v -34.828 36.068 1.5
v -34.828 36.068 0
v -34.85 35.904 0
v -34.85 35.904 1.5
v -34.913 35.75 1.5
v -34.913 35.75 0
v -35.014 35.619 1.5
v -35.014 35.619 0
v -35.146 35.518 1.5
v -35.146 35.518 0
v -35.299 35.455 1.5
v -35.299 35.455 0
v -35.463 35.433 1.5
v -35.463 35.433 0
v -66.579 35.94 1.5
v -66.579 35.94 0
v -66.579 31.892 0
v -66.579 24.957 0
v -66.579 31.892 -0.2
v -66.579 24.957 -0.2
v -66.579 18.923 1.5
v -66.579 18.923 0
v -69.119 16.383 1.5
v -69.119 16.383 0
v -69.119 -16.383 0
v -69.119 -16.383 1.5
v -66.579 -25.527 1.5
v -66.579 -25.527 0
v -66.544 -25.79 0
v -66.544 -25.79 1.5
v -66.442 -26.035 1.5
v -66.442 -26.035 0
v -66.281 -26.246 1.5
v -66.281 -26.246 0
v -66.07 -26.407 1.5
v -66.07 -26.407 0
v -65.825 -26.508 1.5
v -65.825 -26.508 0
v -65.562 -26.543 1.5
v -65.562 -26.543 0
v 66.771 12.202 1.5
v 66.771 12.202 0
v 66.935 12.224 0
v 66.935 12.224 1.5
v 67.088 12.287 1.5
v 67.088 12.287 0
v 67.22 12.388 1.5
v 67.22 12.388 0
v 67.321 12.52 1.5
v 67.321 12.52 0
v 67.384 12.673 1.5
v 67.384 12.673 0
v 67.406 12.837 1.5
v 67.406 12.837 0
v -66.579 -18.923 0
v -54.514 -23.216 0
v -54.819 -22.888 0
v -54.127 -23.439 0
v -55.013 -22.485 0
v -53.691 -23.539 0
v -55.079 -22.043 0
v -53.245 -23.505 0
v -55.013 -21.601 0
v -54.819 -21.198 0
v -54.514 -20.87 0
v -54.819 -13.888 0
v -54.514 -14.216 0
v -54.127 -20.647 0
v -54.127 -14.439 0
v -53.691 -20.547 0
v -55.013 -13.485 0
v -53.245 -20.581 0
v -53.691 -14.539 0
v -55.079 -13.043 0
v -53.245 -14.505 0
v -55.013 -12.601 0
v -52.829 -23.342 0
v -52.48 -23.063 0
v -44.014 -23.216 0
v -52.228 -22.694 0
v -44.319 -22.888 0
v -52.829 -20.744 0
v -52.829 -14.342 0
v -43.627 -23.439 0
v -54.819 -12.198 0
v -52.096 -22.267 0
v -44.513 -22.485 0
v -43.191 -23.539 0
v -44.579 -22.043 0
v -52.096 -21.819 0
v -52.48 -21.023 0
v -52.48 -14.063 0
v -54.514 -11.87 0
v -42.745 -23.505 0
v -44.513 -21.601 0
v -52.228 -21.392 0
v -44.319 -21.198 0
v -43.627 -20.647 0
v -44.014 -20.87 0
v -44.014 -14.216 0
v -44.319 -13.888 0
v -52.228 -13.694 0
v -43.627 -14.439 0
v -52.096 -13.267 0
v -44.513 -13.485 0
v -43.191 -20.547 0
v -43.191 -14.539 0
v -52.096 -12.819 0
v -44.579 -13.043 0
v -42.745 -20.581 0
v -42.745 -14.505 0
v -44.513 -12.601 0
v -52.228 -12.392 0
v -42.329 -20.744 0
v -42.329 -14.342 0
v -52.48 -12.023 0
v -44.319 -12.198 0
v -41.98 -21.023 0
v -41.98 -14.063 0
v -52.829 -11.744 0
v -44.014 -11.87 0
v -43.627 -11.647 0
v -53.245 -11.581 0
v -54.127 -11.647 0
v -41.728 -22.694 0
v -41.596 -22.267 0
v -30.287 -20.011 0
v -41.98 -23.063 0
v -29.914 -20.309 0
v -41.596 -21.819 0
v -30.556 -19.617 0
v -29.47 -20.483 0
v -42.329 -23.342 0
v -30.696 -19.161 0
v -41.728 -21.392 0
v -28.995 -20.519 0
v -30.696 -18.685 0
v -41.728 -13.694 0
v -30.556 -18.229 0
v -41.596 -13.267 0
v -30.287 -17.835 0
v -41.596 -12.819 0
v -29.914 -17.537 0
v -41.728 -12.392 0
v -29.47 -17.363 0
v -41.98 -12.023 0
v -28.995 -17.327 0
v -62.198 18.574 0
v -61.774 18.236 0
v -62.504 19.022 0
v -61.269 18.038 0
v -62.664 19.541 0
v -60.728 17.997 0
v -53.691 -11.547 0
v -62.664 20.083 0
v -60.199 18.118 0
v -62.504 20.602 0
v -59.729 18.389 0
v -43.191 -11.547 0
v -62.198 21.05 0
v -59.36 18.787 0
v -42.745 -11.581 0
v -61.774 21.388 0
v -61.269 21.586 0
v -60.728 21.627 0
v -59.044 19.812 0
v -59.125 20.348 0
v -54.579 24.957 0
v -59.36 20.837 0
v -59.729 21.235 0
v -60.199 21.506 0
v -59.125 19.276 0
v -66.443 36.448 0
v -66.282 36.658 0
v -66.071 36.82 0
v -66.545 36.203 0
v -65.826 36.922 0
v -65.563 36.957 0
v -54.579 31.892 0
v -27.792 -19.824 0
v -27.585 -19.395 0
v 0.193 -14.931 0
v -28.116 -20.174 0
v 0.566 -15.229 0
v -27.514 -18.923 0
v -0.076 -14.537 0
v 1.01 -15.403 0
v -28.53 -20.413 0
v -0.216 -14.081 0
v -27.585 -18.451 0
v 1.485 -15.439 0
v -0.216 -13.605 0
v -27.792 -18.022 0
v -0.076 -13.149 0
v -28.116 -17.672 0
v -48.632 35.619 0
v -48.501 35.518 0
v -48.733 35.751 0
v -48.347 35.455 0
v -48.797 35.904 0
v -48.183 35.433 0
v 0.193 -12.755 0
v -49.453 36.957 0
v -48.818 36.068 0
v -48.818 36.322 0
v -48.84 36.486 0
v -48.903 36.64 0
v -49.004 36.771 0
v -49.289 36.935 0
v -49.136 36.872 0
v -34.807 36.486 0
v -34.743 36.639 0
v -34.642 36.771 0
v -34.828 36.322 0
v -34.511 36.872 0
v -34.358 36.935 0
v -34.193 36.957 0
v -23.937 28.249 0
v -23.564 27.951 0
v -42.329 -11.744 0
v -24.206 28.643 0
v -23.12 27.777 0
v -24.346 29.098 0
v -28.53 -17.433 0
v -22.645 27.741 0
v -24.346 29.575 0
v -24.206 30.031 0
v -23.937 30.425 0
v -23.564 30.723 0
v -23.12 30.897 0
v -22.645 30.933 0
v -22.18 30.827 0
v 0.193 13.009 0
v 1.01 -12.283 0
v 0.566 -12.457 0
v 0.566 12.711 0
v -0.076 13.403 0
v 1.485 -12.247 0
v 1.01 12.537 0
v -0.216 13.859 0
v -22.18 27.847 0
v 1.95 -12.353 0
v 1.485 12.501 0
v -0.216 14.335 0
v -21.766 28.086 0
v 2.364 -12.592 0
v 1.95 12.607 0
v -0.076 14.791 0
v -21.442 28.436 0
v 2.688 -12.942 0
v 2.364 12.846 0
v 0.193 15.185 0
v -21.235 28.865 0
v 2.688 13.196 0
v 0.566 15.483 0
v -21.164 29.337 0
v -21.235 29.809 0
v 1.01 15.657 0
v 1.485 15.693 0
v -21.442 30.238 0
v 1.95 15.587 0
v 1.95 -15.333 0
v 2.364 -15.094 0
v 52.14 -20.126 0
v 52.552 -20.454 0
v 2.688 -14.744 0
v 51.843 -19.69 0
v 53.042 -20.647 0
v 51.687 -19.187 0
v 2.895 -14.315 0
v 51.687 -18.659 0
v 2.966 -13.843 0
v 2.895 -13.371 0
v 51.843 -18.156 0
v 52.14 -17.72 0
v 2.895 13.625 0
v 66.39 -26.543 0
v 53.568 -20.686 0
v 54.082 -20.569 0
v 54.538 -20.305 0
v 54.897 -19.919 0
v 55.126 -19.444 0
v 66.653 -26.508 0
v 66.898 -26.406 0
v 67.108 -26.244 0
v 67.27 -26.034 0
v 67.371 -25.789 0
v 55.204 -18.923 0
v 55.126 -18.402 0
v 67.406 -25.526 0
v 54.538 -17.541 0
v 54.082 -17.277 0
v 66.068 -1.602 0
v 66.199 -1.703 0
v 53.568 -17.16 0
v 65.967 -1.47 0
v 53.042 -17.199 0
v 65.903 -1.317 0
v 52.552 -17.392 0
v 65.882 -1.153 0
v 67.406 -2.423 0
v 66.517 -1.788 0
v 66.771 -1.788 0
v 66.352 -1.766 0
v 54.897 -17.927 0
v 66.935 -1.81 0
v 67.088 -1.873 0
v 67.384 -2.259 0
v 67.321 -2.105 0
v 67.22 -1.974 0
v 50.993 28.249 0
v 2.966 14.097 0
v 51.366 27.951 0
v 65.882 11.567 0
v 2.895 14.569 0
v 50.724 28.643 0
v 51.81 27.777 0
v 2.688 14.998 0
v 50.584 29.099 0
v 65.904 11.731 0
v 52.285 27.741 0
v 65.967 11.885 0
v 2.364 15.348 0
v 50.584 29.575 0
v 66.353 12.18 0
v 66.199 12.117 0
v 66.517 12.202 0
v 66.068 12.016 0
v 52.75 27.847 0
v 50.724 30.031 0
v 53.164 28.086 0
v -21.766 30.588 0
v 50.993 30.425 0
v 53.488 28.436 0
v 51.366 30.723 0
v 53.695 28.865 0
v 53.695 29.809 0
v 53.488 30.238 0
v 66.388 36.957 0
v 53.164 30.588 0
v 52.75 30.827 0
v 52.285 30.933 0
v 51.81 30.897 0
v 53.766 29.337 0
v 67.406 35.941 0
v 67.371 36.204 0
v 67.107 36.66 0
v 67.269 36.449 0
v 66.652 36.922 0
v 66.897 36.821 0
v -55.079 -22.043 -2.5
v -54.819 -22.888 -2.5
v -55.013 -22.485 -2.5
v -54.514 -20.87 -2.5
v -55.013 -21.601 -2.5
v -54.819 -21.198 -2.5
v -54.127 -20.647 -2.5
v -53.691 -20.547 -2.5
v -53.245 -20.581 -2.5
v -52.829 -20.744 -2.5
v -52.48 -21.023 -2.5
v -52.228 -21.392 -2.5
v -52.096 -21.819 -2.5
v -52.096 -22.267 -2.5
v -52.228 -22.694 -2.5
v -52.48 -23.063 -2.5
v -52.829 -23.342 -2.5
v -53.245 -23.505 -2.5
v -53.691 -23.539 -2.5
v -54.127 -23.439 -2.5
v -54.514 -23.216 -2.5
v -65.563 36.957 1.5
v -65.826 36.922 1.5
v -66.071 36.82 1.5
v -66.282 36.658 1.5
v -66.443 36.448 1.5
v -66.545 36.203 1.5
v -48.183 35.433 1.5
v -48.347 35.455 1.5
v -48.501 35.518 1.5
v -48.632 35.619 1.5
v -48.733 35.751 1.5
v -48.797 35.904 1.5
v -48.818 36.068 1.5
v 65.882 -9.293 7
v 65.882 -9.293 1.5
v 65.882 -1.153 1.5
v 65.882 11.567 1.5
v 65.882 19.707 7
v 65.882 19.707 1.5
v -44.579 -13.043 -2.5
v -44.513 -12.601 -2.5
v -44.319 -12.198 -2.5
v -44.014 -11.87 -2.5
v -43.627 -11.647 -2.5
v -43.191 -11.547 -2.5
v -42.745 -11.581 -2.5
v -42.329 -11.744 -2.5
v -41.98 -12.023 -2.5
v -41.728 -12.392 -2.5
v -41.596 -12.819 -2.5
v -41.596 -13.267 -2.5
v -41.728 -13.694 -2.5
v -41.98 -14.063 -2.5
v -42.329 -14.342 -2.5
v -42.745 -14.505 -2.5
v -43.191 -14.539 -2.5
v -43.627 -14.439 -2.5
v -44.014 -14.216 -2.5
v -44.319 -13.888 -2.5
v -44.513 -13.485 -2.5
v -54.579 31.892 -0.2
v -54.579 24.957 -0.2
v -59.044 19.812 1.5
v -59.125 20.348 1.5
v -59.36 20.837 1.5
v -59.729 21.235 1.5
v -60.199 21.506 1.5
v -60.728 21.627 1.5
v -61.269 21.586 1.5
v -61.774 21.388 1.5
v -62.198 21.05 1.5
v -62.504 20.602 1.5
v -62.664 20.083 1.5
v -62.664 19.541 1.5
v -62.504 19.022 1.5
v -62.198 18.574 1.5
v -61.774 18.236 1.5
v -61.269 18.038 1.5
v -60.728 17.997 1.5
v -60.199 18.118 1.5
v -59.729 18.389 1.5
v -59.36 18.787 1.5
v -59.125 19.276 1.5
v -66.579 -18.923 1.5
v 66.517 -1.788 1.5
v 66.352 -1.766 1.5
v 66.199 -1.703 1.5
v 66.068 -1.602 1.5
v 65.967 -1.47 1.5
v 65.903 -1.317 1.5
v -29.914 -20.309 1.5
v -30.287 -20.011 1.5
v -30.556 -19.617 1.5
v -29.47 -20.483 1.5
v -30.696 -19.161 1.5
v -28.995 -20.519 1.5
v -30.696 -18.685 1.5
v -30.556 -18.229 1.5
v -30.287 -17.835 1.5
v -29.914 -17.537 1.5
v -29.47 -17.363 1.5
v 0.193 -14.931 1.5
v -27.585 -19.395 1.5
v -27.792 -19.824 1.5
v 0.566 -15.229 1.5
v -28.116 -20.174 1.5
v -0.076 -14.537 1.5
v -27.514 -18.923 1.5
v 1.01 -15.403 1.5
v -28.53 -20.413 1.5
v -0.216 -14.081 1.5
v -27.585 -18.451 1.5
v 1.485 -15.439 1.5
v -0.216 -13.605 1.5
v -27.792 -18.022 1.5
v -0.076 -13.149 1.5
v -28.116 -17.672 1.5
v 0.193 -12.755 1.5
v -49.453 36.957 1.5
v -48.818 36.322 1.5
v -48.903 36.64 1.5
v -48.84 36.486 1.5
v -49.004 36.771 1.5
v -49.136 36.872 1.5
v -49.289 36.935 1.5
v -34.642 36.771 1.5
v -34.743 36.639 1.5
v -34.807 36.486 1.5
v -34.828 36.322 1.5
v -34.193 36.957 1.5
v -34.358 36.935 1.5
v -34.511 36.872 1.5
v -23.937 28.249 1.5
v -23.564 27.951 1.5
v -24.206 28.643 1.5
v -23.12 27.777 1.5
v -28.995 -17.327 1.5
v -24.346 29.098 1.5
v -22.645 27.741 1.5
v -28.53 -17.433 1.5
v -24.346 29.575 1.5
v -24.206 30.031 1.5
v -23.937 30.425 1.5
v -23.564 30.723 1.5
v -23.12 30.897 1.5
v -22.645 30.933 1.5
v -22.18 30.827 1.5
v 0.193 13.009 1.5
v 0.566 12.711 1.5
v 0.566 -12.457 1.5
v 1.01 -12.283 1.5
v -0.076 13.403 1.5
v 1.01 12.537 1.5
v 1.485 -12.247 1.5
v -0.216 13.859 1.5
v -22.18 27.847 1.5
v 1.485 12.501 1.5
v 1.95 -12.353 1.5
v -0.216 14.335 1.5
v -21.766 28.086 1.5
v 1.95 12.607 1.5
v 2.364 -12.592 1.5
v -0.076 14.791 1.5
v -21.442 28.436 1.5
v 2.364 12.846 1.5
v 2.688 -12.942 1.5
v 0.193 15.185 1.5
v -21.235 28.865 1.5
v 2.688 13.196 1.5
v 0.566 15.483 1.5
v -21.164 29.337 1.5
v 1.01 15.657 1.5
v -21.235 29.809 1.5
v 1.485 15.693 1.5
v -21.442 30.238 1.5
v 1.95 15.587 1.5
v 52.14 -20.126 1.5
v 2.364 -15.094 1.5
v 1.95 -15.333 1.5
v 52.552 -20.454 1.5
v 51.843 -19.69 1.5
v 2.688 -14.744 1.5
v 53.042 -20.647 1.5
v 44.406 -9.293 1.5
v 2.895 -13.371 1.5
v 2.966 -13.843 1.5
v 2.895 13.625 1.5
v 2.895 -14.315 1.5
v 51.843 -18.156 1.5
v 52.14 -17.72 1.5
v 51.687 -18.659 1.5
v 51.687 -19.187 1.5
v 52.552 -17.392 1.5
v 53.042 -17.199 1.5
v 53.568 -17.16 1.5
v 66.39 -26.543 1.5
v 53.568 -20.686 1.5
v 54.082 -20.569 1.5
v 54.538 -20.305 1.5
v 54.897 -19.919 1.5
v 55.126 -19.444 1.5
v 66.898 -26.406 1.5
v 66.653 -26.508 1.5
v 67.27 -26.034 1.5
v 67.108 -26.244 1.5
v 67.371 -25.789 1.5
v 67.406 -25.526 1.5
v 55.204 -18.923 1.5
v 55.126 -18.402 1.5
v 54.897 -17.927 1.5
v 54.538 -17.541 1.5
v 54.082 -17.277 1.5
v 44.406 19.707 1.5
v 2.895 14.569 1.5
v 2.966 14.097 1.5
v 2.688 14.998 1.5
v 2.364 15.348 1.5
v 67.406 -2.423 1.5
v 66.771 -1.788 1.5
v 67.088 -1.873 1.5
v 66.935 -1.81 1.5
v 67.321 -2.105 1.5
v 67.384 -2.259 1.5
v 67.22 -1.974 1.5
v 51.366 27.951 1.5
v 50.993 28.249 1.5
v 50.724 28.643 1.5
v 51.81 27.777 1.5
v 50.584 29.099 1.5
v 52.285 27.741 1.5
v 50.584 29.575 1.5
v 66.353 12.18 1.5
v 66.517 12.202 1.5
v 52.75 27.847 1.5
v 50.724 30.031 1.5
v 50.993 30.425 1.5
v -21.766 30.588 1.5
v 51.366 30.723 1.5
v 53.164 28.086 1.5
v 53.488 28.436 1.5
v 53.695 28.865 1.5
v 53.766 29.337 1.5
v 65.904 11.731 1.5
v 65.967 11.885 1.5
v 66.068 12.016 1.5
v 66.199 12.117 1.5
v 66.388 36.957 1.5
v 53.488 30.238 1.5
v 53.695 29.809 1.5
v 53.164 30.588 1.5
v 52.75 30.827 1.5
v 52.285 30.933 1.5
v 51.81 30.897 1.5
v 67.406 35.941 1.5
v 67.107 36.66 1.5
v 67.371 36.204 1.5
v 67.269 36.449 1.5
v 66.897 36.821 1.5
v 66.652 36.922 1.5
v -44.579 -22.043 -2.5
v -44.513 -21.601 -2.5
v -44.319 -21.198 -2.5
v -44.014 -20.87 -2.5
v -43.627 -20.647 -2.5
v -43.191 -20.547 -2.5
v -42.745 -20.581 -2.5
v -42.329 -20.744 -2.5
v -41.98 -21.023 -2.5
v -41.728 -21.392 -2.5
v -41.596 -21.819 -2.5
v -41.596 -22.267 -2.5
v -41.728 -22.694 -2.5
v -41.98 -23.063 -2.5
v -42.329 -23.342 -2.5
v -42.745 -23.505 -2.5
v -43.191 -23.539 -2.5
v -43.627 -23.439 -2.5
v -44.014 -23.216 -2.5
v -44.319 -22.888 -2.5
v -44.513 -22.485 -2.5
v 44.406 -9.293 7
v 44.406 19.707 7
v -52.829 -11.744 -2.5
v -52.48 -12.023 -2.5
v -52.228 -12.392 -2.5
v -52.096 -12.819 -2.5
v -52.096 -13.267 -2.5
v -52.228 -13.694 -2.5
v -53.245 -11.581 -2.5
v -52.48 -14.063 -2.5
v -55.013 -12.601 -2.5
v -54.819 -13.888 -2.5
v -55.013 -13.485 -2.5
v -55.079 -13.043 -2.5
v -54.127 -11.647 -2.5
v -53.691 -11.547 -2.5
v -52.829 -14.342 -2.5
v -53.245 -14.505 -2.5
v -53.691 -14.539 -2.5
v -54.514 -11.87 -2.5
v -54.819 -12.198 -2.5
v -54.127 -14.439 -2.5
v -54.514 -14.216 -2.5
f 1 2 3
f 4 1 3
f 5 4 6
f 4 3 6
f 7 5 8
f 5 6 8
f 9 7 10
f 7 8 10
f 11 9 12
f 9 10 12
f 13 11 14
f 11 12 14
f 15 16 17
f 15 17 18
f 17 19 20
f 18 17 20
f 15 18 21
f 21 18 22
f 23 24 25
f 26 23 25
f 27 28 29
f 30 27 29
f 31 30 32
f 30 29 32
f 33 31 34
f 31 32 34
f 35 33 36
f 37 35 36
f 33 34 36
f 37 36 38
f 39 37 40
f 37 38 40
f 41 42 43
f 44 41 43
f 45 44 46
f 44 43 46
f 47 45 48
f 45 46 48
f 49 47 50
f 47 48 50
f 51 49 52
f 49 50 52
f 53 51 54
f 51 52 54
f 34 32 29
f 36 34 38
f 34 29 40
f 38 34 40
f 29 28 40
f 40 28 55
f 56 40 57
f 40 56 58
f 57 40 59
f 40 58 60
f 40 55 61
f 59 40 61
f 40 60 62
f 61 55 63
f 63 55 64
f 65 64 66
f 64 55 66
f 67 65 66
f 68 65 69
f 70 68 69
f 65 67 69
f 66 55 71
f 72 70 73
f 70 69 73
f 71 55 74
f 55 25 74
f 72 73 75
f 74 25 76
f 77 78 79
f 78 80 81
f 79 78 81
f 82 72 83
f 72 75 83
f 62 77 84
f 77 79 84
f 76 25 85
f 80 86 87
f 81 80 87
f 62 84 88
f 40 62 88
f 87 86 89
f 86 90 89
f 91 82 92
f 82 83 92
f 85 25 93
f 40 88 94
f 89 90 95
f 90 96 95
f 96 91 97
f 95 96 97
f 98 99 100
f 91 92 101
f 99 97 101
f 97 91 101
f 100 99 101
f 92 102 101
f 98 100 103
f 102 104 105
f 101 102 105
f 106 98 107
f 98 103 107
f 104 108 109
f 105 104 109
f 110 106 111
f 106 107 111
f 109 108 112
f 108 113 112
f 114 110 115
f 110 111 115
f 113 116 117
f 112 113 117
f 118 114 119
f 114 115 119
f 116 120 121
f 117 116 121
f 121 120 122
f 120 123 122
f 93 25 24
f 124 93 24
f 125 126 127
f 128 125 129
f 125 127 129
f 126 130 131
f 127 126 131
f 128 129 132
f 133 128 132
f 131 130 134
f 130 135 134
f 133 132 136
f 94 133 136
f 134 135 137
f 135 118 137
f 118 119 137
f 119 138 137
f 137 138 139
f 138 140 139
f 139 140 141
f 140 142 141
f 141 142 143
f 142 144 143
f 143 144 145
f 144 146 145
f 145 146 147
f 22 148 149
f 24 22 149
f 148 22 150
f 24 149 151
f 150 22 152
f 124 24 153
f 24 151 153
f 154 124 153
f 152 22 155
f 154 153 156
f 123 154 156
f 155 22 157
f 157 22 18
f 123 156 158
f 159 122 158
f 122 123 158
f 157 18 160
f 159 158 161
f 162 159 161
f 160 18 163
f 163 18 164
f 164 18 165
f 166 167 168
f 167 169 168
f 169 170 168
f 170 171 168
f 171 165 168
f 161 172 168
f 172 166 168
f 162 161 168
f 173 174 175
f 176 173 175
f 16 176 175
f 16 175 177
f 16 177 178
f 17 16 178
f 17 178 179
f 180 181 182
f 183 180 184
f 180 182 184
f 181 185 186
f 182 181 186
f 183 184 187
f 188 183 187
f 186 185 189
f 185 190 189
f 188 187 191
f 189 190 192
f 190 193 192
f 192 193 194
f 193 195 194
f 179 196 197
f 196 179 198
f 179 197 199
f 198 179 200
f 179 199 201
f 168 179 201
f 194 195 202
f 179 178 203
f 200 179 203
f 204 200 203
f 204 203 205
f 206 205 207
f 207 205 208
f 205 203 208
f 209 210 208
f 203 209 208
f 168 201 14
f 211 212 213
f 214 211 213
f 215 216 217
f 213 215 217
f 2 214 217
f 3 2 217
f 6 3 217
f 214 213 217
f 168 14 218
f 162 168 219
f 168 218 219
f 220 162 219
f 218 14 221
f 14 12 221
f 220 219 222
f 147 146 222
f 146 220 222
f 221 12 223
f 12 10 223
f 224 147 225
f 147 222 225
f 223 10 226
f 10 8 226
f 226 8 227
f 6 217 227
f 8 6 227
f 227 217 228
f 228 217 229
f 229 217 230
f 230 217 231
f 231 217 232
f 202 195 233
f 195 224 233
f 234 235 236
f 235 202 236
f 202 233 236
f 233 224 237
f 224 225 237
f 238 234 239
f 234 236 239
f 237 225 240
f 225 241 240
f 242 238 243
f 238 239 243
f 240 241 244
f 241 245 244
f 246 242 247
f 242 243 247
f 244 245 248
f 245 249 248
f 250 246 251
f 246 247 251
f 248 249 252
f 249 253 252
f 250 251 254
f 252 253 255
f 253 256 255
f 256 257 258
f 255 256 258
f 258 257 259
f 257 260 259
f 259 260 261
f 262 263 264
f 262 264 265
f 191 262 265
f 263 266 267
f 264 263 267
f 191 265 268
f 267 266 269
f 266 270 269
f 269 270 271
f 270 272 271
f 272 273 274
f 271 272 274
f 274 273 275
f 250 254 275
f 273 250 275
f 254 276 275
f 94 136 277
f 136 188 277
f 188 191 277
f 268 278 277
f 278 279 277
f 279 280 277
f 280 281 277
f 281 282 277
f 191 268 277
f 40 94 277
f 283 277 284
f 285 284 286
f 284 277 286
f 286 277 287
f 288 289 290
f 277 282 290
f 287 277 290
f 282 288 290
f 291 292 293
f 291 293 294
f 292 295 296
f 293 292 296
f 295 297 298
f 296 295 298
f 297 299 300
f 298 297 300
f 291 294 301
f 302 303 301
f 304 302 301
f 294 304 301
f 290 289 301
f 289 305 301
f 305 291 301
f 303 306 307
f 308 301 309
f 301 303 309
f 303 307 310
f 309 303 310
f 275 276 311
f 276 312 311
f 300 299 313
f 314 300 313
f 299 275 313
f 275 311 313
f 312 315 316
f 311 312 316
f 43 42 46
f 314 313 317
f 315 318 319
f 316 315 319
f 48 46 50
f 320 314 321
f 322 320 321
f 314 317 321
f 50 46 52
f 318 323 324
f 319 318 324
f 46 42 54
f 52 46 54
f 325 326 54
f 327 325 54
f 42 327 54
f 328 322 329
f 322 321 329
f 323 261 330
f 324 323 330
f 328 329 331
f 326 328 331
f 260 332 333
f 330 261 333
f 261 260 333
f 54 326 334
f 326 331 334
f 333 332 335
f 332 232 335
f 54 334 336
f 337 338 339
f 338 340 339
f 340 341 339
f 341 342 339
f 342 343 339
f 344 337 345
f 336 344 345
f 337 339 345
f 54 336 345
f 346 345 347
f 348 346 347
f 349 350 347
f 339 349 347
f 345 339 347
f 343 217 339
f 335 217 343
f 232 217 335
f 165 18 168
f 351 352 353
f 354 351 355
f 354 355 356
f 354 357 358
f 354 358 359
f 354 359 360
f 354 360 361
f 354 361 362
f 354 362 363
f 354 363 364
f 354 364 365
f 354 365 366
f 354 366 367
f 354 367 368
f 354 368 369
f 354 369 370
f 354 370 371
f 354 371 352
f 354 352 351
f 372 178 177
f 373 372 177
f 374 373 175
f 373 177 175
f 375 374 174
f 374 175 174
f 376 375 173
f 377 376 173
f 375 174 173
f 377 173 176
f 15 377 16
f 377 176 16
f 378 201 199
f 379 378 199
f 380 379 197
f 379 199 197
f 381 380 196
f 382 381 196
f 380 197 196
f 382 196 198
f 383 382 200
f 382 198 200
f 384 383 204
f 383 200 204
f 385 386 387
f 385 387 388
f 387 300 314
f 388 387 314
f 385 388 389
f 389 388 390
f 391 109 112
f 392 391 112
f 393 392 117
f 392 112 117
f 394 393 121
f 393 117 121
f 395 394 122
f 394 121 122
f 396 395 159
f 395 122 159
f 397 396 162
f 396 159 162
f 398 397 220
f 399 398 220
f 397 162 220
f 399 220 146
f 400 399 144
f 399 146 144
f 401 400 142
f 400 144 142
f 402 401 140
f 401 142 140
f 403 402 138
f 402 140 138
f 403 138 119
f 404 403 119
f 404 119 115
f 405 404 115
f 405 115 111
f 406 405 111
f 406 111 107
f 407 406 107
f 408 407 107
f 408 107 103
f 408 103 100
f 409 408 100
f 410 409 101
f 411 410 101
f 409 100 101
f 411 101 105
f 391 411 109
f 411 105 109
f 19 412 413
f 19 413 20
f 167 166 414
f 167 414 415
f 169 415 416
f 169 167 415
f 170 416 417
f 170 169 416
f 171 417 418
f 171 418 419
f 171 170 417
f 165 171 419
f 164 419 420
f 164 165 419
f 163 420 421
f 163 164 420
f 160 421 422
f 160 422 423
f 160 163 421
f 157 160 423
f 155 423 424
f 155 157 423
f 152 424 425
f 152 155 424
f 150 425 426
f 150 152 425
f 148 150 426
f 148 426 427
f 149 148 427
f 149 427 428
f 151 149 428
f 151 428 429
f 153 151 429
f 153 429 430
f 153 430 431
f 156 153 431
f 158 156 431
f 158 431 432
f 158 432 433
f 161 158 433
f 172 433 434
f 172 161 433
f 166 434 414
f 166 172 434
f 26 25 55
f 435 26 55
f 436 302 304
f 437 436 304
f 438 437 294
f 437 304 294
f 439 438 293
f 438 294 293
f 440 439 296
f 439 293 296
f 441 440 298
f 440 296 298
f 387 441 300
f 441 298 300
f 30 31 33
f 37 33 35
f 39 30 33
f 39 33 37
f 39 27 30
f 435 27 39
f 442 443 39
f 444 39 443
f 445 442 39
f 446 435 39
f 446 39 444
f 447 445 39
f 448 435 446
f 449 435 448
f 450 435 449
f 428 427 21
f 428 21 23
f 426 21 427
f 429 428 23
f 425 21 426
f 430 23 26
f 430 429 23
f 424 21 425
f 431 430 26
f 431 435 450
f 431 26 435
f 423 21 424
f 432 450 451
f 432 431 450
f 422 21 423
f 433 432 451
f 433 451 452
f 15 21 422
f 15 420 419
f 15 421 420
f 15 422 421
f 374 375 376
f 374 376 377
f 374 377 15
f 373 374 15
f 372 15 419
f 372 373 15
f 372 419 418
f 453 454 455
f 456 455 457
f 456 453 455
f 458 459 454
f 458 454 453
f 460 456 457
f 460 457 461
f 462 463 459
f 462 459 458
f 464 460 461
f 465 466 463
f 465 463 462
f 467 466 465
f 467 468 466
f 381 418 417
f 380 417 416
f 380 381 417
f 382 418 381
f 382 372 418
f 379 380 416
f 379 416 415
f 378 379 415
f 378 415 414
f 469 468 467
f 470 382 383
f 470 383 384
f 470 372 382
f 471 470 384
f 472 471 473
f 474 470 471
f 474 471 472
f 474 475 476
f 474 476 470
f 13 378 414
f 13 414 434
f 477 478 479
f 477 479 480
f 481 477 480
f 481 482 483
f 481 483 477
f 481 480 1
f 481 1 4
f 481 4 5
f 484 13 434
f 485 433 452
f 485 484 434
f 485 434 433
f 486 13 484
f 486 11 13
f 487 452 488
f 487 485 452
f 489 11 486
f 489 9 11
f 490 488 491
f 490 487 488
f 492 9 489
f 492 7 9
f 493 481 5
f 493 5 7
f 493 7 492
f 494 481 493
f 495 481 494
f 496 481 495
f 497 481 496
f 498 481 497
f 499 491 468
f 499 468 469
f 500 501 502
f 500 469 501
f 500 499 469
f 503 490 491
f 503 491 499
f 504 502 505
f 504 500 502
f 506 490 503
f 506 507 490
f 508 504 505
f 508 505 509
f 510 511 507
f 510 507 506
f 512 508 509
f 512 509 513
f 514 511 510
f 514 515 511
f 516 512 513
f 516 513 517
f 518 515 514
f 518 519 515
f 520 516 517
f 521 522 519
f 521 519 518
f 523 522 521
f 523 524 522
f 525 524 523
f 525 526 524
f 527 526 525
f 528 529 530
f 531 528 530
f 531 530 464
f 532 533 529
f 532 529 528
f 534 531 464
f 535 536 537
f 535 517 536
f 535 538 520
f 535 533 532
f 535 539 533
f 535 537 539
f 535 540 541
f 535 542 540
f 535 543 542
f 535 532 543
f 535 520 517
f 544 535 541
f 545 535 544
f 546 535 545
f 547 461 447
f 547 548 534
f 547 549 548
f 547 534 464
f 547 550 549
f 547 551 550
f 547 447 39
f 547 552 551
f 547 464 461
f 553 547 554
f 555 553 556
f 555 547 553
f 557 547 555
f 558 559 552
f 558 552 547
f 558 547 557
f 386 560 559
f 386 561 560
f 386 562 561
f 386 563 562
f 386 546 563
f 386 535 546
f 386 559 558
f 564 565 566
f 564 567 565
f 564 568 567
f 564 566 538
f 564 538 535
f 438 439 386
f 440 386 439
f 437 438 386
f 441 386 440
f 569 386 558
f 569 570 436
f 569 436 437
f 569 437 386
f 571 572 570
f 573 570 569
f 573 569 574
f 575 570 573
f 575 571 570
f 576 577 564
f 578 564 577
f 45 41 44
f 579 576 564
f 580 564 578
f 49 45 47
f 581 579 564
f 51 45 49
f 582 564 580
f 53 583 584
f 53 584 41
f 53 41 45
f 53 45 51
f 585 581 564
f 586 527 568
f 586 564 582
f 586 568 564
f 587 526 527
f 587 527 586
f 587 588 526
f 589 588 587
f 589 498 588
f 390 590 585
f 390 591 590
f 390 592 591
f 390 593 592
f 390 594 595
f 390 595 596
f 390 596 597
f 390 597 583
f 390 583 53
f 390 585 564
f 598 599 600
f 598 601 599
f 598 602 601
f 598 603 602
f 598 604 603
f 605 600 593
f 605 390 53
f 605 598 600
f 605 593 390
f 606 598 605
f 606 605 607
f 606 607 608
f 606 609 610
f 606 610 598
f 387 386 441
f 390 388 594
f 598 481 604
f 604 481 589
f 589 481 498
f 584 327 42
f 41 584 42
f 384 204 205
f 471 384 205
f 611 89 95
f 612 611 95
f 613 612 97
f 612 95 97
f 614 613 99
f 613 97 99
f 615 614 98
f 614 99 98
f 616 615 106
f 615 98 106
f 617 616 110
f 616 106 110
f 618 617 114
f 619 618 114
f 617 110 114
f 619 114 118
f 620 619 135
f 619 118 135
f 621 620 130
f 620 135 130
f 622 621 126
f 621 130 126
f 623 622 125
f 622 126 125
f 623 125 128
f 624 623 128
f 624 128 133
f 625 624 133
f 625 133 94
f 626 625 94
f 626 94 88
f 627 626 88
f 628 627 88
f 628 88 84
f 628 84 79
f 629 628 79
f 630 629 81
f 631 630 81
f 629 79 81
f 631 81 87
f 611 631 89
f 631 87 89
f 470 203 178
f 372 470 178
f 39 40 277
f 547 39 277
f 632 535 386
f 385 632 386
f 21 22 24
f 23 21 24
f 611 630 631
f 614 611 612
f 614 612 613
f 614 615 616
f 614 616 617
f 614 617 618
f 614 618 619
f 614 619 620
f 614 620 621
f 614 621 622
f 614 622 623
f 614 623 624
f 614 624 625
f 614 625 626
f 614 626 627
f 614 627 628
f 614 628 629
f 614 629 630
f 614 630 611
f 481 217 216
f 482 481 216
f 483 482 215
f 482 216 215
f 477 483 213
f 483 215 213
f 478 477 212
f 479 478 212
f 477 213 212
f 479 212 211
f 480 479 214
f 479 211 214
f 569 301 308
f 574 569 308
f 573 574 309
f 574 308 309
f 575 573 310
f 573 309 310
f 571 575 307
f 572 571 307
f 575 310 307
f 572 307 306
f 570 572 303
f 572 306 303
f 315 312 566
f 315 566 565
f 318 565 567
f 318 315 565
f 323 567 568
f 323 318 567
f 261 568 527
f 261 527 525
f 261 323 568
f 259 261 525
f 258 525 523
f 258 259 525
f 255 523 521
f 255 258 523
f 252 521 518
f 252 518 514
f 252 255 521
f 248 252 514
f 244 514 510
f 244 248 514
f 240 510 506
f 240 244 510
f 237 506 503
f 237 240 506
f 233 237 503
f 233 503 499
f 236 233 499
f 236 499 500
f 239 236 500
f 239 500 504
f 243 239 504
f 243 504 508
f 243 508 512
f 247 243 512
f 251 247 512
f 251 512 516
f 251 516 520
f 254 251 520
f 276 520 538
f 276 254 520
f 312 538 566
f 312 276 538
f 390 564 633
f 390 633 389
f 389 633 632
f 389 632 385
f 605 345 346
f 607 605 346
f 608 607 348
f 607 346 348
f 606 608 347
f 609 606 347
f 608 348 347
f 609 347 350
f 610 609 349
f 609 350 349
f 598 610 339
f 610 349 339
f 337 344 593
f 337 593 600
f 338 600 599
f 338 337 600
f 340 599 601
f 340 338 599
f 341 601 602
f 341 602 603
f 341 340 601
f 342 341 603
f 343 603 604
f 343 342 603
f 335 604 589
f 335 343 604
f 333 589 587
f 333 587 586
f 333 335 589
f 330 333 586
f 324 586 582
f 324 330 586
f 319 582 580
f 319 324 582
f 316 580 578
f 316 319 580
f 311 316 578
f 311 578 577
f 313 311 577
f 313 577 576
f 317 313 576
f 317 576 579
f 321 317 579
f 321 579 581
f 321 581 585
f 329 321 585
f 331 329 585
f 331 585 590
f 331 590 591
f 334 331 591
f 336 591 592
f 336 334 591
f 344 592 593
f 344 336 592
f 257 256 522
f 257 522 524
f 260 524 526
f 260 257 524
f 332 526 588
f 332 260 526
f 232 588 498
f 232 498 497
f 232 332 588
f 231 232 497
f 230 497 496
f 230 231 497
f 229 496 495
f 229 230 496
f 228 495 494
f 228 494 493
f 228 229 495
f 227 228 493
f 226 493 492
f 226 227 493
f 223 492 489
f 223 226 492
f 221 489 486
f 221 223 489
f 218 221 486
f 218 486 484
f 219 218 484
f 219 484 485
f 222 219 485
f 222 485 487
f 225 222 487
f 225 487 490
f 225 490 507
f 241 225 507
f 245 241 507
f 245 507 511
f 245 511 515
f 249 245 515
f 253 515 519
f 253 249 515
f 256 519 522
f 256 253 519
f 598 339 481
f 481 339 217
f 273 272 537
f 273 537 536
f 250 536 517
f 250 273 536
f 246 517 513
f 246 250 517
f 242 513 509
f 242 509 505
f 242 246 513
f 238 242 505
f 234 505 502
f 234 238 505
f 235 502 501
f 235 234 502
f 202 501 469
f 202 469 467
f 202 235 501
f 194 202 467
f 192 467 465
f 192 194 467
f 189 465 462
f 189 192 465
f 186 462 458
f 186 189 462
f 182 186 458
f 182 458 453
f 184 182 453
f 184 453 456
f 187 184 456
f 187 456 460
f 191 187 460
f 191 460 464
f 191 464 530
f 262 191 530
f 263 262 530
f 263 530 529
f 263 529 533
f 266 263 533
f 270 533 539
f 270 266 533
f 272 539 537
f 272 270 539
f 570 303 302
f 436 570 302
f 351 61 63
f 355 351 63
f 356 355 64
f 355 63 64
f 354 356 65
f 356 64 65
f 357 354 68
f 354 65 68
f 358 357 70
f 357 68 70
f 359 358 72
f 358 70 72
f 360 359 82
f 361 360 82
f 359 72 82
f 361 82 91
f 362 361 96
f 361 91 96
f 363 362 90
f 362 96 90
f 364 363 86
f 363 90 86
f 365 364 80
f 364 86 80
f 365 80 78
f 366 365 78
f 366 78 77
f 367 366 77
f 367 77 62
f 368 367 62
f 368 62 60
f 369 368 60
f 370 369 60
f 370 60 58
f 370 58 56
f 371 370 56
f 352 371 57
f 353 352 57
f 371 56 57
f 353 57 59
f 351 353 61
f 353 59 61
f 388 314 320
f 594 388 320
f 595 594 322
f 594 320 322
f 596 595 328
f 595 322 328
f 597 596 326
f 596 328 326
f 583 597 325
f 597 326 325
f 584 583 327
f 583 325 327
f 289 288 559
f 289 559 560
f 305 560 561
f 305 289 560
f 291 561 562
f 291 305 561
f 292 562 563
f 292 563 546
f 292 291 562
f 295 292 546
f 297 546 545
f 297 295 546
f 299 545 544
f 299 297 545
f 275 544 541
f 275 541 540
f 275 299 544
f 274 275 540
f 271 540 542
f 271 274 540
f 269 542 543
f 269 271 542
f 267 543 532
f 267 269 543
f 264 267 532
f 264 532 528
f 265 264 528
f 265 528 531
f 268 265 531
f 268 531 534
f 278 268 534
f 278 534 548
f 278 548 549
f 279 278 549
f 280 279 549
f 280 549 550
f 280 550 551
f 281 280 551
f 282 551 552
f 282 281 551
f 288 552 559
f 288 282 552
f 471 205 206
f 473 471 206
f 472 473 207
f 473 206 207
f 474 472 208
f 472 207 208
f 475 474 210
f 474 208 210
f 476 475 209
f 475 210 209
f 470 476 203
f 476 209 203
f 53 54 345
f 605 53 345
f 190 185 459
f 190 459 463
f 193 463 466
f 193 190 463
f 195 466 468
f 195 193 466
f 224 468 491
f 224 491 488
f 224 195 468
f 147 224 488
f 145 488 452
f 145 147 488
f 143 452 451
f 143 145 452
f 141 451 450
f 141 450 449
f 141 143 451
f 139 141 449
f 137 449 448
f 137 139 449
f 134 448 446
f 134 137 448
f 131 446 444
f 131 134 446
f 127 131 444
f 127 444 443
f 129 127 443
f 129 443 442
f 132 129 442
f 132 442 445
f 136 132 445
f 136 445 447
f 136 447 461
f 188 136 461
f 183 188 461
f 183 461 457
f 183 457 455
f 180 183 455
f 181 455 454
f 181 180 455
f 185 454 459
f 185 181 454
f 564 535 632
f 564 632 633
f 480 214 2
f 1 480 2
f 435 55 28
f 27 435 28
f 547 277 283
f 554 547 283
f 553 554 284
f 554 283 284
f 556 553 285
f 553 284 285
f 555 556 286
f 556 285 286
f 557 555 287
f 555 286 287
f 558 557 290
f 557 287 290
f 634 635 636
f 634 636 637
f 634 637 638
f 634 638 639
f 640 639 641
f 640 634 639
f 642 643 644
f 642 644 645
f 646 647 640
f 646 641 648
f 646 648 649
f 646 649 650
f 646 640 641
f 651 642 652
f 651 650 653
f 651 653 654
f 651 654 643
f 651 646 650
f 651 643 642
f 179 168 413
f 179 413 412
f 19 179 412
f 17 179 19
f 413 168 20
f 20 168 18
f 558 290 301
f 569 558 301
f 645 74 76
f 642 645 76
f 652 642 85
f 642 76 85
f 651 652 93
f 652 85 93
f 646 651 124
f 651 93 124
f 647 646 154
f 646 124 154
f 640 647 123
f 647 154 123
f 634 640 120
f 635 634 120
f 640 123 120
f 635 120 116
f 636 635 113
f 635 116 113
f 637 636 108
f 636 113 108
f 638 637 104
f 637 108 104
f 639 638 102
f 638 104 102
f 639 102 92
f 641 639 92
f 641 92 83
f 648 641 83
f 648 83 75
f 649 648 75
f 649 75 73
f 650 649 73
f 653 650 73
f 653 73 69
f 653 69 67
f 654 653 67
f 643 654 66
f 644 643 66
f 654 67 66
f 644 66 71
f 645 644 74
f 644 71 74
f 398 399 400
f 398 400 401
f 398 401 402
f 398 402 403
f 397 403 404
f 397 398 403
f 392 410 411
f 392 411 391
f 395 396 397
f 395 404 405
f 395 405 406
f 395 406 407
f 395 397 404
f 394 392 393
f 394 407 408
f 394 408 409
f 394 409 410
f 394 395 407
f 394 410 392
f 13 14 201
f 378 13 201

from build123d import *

# Parameters (mm, degrees)
ESBO_O2_R                = 1.820066551
ESBO_O2_R_2              = 1.6002
ESBO_O2_R_3              = 1.768261329
RESSALTO_EXTRUS_O1_DEPTH = 1.5
ARQUIVOS_LOCAIS1_R       = 1.5
RESSALTO_EXTRUS_O2_DEPTH = 2.5
ARQUIVOS_LOCAIS2_W       = 12
ARQUIVOS_LOCAIS2_H       = 6.934834447
RESSALTO_EXTRUS_O3_DEPTH = 0.2
ARQUIVOS_LOCAIS3_W       = 21.475999934
ARQUIVOS_LOCAIS3_H       = 29
RESSALTO_EXTRUS_O4_DEPTH = 5.5


with BuildPart() as part:
    # Esboço2 → Ressalto-extrusão1 (new body)
    with BuildSketch(Plane.XY):
        with BuildLine():
            Line((66.770810212, -1.788001123), (66.516852098, -1.788001123))
            ThreePointArc((66.516852098, -1.788001123), (66.067836522, -1.601984783), (65.881852046, -1.152956008))
            Line((65.881852046, -1.152956008), (65.881852046, 11.567000327))
            ThreePointArc((65.881852046, 11.567000327), (66.067868997, 12.016014785), (66.516897161, 12.20199865))
            Line((66.516897161, 12.20199865), (66.770852104, 12.20199865))
            ThreePointArc((66.770852104, 12.20199865), (67.219867652, 12.38801502), (67.405852112, 12.837043786))
            Line((67.405852112, 12.837043786), (67.405852112, 35.941000874))
            ThreePointArc((67.405852112, 35.941000874), (67.107342698, 36.659508424), (66.388413427, 36.957000731))
            Line((66.388413427, 36.957000731), (-34.193146911, 36.957000731))
            ThreePointArc((-34.193146911, 36.957000731), (-34.642164318, 36.770979998), (-34.82814905, 36.321947678))
            Line((-34.82814905, 36.321947678), (-34.82814905, 36.068000792))
            ThreePointArc((-34.82814905, 36.068000792), (-35.014158502, 35.618987038), (-35.463182564, 35.43300247))
            Line((-35.463182564, 35.43300247), (-48.183144777, 35.43300247))
            ThreePointArc((-48.183144777, 35.43300247), (-48.632160998, 35.619010573), (-48.818146915, 36.068035984))
            Line((-48.818146915, 36.068035984), (-48.818146915, 36.322002409))
            ThreePointArc((-48.818146915, 36.322002409), (-49.004168997, 36.771017349), (-49.453199968, 36.957000732))
            Line((-49.453199968, 36.957000732), (-65.563142032, 36.957000732))
            ThreePointArc((-65.563142032, 36.957000732), (-66.281654952, 36.658489436), (-66.57914953, 35.939554956))
            Line((-66.57914953, 35.939554956), (-66.57914953, 18.923000336))
            Line((-66.57914953, 18.923000336), (-69.119142817, 16.38299942))
            Line((-69.119142817, 16.38299942), (-69.119142817, -16.38299942))
            Line((-69.119142817, -16.38299942), (-66.57914953, -18.922999382))
            Line((-66.57914953, -18.922999382), (-66.57914953, -25.526999235))
            ThreePointArc((-66.57914953, -25.526999235), (-66.280636326, -26.245507951), (-65.561704328, -26.543000285))
            Line((-65.561704328, -26.543000285), (66.389851048, -26.543000285))
            ThreePointArc((66.389851048, -26.543000285), (67.108359334, -26.244491656), (67.405852096, -25.525562163))
            Line((67.405852096, -25.525562163), (67.405852096, -2.422999446))
            ThreePointArc((67.405852096, -2.422999446), (67.219837234, -1.973985183), (66.770810212, -1.788001123))
        make_face()
        with Locations((-60.86414892, 19.812000732)):
            Circle(ESBO_O2_R, mode=Mode.SUBTRACT)
        with Locations((-22.76414892, 29.336990572)):
            Circle(ESBO_O2_R_2, mode=Mode.SUBTRACT)
        with Locations((1.36585108, 14.097000732)):
            Circle(ESBO_O2_R_2, mode=Mode.SUBTRACT)
        with Locations((-29.11414892, -18.922999268)):
            Circle(ESBO_O2_R_2, mode=Mode.SUBTRACT)
        with Locations((1.36585108, -13.842999268)):
            Circle(ESBO_O2_R_2, mode=Mode.SUBTRACT)
        with Locations((52.16585108, 29.337000732)):
            Circle(ESBO_O2_R_2, mode=Mode.SUBTRACT)
        with Locations((53.43585108, -18.922999268)):
            Circle(ESBO_O2_R_3, mode=Mode.SUBTRACT)
    extrude(amount=RESSALTO_EXTRUS_O1_DEPTH)

    # Arquivos locais1 → Ressalto-extrusão2 (add)
    with BuildSketch(Plane(origin=(0, 0, 0), x_dir=(-1, 0, 0), z_dir=(0, 0, -1))):
        with Locations((43.07914953, -13.043000285)):
            Circle(ARQUIVOS_LOCAIS1_R)
        with Locations((53.57914953, -13.043000285)):
            Circle(ARQUIVOS_LOCAIS1_R)
        with Locations((43.07914953, -22.043000285)):
            Circle(ARQUIVOS_LOCAIS1_R)
        with Locations((53.57914953, -22.043000285)):
            Circle(ARQUIVOS_LOCAIS1_R)
    extrude(amount=RESSALTO_EXTRUS_O2_DEPTH)

    # Arquivos locais2 → Ressalto-extrusão3 (add)
    with BuildSketch(Plane(origin=(0, 0, 0), x_dir=(-1, 0, 0), z_dir=(0, 0, -1))):
        with Locations((60.57914953, 28.424417956)):
            Rectangle(ARQUIVOS_LOCAIS2_W, ARQUIVOS_LOCAIS2_H)
    extrude(amount=RESSALTO_EXTRUS_O3_DEPTH)

    # Arquivos locais3 → Ressalto-extrusão4 (add)
    with BuildSketch(Plane.XY.offset(1.5)):
        with Locations((55.143852079, 5.20702216)):
            Rectangle(ARQUIVOS_LOCAIS3_W, ARQUIVOS_LOCAIS3_H)
    extrude(amount=RESSALTO_EXTRUS_O4_DEPTH)


solid = part.part
